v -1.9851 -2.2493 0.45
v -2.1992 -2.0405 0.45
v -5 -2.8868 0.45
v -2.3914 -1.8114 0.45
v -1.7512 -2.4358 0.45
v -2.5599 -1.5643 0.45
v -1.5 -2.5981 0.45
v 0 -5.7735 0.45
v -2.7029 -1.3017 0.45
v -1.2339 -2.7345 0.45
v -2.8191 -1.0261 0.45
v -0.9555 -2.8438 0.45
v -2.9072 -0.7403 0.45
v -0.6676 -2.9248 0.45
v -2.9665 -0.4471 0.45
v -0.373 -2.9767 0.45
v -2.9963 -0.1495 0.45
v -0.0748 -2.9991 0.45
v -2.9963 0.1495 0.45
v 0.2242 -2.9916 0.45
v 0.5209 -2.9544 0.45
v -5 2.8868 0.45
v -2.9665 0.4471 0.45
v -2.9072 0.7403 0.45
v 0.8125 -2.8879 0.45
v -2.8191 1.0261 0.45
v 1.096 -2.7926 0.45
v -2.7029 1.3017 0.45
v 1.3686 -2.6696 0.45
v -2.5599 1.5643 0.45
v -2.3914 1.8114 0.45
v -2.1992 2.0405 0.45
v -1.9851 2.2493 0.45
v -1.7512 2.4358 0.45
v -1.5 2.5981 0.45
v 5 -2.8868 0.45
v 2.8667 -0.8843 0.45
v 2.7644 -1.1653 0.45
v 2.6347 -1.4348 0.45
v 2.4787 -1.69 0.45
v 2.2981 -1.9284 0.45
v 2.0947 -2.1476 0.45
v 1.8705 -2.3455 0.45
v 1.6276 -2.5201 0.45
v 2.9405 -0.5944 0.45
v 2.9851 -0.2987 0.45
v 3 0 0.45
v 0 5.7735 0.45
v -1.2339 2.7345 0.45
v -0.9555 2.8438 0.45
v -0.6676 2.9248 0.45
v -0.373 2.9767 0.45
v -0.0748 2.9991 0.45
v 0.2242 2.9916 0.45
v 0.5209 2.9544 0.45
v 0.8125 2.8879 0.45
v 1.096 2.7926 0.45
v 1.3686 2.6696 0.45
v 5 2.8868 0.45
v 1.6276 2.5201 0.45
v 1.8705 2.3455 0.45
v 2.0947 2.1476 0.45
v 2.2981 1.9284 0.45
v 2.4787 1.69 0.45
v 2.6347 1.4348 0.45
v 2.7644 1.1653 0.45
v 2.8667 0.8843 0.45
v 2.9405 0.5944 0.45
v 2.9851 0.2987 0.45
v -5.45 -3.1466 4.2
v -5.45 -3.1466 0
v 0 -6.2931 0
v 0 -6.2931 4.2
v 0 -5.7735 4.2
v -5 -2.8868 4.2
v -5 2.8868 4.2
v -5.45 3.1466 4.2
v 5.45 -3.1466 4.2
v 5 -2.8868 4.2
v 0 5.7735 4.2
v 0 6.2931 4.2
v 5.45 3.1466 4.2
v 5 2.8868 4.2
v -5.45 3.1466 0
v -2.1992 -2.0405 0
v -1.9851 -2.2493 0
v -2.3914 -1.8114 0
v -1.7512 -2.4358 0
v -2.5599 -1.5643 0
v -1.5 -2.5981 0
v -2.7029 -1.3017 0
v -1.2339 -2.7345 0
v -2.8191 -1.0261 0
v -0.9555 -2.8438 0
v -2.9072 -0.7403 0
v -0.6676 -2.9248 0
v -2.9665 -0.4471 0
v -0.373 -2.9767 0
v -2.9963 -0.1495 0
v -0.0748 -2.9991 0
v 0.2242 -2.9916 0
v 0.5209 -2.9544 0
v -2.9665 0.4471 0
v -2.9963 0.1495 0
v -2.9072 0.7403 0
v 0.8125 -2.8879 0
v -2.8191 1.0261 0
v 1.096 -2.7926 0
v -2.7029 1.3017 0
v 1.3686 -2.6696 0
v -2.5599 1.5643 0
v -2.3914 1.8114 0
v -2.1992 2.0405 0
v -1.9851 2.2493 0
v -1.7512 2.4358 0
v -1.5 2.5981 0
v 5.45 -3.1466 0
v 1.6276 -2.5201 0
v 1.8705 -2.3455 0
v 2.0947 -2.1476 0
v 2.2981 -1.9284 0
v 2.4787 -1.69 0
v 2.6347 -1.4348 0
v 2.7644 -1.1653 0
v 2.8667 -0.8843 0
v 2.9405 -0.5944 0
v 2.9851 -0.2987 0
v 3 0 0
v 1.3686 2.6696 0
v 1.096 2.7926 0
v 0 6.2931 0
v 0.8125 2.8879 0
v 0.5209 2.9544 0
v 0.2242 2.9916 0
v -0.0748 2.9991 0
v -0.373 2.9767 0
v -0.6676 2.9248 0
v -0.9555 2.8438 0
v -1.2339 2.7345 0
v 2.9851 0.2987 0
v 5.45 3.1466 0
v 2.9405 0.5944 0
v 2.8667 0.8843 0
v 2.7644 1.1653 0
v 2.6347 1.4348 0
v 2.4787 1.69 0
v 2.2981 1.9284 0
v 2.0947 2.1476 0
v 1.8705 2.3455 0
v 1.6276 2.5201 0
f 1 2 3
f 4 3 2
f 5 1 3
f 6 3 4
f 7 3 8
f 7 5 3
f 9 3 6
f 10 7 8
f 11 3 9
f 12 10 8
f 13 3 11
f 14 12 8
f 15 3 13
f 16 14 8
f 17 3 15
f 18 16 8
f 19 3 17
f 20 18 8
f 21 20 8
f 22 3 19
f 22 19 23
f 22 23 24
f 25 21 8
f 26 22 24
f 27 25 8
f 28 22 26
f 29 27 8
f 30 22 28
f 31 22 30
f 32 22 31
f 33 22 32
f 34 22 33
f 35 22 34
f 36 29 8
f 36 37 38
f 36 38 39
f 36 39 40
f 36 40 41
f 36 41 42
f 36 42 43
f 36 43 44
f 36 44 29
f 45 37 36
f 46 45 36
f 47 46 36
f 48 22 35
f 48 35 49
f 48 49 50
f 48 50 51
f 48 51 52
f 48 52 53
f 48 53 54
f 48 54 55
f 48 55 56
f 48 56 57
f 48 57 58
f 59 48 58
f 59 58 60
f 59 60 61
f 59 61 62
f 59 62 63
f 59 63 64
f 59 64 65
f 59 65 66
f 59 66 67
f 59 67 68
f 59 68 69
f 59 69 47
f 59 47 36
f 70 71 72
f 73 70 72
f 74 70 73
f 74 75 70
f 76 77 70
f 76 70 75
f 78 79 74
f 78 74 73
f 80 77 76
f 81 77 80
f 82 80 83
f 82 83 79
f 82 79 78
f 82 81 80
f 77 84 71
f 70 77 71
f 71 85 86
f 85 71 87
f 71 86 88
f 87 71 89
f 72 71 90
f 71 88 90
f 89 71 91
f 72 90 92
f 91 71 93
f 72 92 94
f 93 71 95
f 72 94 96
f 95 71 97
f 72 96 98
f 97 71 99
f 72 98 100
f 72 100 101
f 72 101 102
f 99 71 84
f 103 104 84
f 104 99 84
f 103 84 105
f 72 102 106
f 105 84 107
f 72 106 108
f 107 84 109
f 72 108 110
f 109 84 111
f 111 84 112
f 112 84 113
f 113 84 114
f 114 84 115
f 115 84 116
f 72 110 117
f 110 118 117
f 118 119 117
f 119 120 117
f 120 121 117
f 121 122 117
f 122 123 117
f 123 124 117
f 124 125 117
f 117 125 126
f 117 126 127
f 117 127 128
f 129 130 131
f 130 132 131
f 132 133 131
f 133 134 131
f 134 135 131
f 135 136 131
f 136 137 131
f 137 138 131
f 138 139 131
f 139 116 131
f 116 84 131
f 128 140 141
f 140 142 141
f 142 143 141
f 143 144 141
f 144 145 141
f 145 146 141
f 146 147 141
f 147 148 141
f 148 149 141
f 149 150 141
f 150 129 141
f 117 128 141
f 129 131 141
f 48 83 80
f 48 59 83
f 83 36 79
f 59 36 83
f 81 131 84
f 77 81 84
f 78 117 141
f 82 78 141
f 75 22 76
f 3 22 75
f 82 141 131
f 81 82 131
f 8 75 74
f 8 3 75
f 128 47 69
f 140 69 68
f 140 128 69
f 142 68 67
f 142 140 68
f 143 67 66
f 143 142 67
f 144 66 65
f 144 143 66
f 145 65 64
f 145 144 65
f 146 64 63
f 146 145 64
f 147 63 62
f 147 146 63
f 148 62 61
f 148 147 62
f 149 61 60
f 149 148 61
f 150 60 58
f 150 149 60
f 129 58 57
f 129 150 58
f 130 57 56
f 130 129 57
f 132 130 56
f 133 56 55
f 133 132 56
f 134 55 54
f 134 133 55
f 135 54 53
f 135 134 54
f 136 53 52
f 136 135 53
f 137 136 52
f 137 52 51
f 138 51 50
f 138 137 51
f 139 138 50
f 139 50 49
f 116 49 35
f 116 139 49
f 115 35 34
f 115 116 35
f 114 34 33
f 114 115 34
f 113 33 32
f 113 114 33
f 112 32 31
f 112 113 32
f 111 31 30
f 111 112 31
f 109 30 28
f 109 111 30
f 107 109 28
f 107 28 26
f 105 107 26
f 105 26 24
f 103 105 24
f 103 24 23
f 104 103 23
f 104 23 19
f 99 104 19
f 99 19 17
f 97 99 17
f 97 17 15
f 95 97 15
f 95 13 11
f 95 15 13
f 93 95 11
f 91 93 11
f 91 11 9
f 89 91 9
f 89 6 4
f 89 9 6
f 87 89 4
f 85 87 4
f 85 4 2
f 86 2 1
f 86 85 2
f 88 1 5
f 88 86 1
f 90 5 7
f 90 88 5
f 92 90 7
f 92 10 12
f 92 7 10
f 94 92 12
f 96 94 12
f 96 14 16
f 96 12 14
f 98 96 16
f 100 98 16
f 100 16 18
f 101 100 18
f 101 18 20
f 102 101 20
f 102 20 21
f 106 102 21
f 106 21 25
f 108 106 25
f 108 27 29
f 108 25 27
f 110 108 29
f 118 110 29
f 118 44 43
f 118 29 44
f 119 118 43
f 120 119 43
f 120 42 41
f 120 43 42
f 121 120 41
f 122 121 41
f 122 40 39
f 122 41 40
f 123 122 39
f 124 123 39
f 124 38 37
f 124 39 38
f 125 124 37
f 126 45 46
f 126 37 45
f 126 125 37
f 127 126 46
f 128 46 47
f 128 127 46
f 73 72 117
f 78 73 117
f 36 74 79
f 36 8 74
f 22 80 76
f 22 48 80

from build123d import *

# Parameters (mm, degrees)
F0_R     = 3
F1_DEPTH = 4.2
F2_T     = -0.45
F3_DEPTH = 0.6


with BuildPart() as f1:
    # F0 (on Top) → F1 (new body)
    with BuildSketch(Plane.XY):
        Polygon((0, -6.2931179342), (5.45, -3.1465589671), (5.45, 3.1465589671), (0, 6.2931179342), (-5.45, 3.1465589671), (-5.45, -3.1465589671), align=None)
        Circle(F0_R, mode=Mode.SUBTRACT)
        Circle(F0_R)
    extrude(amount=F1_DEPTH)

    # F2
    f2_openings = [f1.faces().sort_by_distance(p)[0] for p in [
        (0, 0, 4.2),
    ]]
    offset(amount=F2_T, openings=f2_openings)

    # F0 (on Top) → F3 (cut)
    with BuildSketch(Plane.XY):
        Circle(F0_R)
    extrude(amount=F3_DEPTH, mode=Mode.SUBTRACT)


solid = f1.part
